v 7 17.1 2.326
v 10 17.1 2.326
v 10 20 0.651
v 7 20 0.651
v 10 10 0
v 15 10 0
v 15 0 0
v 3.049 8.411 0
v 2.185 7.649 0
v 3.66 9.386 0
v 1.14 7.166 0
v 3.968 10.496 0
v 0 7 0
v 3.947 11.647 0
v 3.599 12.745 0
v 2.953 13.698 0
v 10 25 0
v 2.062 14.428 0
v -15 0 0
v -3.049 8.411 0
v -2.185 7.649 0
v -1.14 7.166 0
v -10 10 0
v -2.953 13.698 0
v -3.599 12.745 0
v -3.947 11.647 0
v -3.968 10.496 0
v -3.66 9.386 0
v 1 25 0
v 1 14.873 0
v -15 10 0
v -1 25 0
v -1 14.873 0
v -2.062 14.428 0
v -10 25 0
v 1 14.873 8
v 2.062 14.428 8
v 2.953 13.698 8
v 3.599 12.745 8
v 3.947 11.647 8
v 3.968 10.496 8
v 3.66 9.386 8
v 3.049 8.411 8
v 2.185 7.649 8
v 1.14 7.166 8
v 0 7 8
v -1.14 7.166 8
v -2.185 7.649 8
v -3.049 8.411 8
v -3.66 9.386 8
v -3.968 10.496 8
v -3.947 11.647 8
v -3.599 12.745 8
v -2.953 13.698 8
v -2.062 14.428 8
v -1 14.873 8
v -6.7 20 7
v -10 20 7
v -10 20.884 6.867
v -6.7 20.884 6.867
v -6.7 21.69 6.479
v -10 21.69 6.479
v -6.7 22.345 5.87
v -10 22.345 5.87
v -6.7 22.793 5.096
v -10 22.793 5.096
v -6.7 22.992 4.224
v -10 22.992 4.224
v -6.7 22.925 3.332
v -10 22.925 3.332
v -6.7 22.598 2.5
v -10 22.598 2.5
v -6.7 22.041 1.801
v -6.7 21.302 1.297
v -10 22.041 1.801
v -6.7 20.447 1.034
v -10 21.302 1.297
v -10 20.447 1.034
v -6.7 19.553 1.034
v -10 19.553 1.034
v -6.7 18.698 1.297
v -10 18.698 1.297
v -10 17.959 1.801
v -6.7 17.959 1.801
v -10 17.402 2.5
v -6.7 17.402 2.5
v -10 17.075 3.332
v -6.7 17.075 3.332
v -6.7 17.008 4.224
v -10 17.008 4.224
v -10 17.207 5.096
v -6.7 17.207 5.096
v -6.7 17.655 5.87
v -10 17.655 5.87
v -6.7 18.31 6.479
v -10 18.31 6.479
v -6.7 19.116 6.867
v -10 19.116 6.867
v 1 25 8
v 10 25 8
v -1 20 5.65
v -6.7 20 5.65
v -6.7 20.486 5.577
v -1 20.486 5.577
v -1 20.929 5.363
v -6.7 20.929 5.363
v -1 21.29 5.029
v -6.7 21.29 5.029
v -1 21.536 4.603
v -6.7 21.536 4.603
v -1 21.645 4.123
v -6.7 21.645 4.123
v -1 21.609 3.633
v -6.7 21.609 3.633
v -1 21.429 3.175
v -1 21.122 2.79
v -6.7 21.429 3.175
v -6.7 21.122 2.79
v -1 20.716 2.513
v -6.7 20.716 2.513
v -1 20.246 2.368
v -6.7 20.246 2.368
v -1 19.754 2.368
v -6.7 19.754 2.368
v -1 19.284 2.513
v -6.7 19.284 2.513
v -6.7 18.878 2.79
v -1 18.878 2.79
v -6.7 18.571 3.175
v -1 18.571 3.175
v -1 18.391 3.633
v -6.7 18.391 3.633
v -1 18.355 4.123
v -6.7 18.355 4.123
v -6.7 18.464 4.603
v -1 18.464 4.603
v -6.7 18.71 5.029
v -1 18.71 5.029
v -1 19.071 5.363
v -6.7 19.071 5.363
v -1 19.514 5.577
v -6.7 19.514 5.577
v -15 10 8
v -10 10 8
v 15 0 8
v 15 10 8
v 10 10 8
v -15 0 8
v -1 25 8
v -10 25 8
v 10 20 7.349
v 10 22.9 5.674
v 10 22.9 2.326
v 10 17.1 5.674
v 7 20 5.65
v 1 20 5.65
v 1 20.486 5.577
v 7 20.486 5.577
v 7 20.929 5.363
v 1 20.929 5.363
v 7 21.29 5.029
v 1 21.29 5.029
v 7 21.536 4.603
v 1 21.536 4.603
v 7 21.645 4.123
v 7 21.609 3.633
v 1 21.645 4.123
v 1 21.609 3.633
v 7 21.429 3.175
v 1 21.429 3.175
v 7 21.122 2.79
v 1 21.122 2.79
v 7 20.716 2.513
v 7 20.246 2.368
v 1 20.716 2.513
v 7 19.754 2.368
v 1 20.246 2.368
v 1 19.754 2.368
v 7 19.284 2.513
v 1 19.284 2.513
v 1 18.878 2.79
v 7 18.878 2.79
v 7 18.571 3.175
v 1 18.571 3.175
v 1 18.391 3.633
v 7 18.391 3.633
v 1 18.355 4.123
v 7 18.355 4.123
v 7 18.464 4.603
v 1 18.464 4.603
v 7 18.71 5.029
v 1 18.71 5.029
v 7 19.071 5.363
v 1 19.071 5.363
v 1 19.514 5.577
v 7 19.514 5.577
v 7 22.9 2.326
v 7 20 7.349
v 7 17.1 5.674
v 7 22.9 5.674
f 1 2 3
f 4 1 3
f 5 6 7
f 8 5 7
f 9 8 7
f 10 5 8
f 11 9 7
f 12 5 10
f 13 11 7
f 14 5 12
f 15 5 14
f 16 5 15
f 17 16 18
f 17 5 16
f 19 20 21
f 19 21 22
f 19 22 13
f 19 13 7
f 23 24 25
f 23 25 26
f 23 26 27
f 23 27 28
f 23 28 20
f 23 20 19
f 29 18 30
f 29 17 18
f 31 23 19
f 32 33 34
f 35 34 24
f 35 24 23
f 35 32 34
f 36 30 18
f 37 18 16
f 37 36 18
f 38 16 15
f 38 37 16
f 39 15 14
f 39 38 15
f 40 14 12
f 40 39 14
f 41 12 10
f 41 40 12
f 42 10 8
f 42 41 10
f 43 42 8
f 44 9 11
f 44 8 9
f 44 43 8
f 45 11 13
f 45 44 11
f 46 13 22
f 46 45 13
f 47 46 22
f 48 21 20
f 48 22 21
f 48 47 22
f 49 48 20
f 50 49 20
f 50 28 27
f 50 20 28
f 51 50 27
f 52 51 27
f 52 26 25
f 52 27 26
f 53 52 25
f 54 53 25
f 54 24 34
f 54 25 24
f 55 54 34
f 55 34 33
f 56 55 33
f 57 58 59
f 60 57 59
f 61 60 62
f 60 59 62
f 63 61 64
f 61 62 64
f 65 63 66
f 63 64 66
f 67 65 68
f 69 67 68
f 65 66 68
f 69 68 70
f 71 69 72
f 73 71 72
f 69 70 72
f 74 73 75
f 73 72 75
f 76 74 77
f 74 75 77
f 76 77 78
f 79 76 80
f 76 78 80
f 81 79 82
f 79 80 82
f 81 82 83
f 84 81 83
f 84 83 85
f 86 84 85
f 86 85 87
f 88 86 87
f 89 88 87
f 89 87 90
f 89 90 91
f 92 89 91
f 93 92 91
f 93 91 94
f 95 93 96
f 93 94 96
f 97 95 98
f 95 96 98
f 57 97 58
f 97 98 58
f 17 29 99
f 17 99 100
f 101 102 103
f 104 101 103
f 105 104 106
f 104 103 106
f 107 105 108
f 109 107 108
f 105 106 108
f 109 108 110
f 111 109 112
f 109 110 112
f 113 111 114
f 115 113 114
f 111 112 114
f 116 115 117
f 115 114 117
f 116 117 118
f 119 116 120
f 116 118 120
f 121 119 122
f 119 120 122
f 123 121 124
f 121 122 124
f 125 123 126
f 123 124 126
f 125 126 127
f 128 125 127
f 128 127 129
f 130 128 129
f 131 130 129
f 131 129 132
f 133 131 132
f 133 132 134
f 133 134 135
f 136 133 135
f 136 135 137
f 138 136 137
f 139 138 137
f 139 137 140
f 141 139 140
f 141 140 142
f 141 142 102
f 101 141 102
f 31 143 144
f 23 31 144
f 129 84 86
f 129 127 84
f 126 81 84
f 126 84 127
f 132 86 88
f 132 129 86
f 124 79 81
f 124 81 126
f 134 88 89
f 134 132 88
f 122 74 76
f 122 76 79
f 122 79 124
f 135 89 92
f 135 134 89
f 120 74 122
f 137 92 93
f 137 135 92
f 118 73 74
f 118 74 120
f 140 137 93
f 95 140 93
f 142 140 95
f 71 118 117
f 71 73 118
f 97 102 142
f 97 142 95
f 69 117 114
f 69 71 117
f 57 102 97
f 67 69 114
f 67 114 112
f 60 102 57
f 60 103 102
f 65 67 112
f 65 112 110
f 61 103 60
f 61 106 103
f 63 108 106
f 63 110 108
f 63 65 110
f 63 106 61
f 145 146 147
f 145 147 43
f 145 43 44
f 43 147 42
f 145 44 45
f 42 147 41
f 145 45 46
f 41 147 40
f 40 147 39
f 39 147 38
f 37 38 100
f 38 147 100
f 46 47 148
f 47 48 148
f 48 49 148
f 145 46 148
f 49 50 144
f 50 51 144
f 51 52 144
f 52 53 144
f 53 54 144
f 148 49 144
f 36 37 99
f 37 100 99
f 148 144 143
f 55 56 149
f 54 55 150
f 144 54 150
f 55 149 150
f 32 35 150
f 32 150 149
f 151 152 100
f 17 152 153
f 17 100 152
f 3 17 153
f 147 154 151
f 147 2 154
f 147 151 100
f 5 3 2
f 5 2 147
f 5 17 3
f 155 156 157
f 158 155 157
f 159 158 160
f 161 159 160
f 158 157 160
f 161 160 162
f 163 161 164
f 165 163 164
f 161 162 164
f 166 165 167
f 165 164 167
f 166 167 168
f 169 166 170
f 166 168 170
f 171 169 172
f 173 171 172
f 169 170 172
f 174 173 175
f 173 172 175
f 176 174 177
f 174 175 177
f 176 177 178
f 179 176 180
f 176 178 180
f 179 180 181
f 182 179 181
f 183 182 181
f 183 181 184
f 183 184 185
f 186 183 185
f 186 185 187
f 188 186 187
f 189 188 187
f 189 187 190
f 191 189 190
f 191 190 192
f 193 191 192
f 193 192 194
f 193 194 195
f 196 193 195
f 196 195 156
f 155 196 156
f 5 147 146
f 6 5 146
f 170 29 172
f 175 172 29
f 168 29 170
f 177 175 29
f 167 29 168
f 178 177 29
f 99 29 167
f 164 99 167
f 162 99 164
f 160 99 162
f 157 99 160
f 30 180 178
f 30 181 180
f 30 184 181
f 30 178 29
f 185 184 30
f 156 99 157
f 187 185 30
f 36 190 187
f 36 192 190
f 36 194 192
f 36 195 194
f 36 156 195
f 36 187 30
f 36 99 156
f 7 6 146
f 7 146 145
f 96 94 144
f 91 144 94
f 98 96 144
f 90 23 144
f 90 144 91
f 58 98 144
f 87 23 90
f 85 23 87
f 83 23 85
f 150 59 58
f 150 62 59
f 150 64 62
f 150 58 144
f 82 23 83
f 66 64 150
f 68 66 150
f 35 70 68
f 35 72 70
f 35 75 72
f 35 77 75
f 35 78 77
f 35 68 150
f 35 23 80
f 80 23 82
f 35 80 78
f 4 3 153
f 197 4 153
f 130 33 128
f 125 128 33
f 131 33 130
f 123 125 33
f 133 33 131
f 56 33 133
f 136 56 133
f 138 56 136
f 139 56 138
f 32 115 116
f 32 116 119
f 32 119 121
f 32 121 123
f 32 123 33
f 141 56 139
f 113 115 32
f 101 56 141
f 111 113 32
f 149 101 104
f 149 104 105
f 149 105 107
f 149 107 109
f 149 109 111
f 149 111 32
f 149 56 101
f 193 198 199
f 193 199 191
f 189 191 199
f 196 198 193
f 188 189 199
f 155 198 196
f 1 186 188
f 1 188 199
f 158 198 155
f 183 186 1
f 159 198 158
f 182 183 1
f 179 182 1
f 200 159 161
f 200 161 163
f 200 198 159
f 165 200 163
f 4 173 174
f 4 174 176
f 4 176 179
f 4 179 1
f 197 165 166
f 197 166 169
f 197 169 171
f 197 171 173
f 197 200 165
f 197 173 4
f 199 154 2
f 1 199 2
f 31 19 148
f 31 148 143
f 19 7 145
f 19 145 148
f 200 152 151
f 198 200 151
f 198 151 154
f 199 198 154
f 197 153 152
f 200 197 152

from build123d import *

# Parameters (mm, degrees)
EXTRUDE_1_DEPTH     = 8
CUT_EXTRUDE_1_DEPTH = 9
SKETCH_3_R          = 1.65
CUT_EXTRUDE_2_DEPTH = 26
SKETCH_4_R          = 3
CUT_EXTRUDE_3_DEPTH = 3.3
CUT_EXTRUDE_4_DEPTH = 3


with BuildPart() as part:
    # 草图1 → 凸台-拉伸1 (new body)
    with BuildSketch(Plane.XY):
        Polygon((-10, 25), (10, 25), (10, 10), (15, 10), (15, 0), (-15, 0), (-15, 10), (-10, 10), align=None)
    extrude(amount=EXTRUDE_1_DEPTH)

    # 草图2 → 切除-拉伸1 (cut, through all)
    with BuildSketch(Plane.XY.offset(8)):
        with BuildLine():
            Line((-1, 25), (1, 25))
            Line((1, 25), (1, 14.872983346))
            ThreePointArc((1, 14.872983346), (0, 7), (-1, 14.872983346))
            Line((-1, 14.872983346), (-1, 25))
        make_face()
    extrude(amount=-CUT_EXTRUDE_1_DEPTH, mode=Mode.SUBTRACT)

    # 草图3 → 切除-拉伸2 (cut, through all)
    with BuildSketch(Plane.ZY.offset(10)):
        with Locations((4, 20)):
            Circle(SKETCH_3_R)
    extrude(amount=-CUT_EXTRUDE_2_DEPTH, mode=Mode.SUBTRACT)

    # 草图4 → 切除-拉伸3 (cut)
    with BuildSketch(Plane.ZY.offset(10)):
        with Locations((4, 20)):
            Circle(SKETCH_4_R)
    extrude(amount=-CUT_EXTRUDE_3_DEPTH, mode=Mode.SUBTRACT)

    # 草图5 → 切除-拉伸4 (cut)
    with BuildSketch(Plane(origin=(10, 0, 0), x_dir=(0, 0, -1), z_dir=(1, 0, 0))):
        Polygon((-7.348631561, 20), (-5.674315781, 17.1), (-2.325684219, 17.1), (-0.651368439, 20), (-2.325684219, 22.9), (-5.674315781, 22.9), align=None)
    extrude(amount=-CUT_EXTRUDE_4_DEPTH, mode=Mode.SUBTRACT)


solid = part.part
